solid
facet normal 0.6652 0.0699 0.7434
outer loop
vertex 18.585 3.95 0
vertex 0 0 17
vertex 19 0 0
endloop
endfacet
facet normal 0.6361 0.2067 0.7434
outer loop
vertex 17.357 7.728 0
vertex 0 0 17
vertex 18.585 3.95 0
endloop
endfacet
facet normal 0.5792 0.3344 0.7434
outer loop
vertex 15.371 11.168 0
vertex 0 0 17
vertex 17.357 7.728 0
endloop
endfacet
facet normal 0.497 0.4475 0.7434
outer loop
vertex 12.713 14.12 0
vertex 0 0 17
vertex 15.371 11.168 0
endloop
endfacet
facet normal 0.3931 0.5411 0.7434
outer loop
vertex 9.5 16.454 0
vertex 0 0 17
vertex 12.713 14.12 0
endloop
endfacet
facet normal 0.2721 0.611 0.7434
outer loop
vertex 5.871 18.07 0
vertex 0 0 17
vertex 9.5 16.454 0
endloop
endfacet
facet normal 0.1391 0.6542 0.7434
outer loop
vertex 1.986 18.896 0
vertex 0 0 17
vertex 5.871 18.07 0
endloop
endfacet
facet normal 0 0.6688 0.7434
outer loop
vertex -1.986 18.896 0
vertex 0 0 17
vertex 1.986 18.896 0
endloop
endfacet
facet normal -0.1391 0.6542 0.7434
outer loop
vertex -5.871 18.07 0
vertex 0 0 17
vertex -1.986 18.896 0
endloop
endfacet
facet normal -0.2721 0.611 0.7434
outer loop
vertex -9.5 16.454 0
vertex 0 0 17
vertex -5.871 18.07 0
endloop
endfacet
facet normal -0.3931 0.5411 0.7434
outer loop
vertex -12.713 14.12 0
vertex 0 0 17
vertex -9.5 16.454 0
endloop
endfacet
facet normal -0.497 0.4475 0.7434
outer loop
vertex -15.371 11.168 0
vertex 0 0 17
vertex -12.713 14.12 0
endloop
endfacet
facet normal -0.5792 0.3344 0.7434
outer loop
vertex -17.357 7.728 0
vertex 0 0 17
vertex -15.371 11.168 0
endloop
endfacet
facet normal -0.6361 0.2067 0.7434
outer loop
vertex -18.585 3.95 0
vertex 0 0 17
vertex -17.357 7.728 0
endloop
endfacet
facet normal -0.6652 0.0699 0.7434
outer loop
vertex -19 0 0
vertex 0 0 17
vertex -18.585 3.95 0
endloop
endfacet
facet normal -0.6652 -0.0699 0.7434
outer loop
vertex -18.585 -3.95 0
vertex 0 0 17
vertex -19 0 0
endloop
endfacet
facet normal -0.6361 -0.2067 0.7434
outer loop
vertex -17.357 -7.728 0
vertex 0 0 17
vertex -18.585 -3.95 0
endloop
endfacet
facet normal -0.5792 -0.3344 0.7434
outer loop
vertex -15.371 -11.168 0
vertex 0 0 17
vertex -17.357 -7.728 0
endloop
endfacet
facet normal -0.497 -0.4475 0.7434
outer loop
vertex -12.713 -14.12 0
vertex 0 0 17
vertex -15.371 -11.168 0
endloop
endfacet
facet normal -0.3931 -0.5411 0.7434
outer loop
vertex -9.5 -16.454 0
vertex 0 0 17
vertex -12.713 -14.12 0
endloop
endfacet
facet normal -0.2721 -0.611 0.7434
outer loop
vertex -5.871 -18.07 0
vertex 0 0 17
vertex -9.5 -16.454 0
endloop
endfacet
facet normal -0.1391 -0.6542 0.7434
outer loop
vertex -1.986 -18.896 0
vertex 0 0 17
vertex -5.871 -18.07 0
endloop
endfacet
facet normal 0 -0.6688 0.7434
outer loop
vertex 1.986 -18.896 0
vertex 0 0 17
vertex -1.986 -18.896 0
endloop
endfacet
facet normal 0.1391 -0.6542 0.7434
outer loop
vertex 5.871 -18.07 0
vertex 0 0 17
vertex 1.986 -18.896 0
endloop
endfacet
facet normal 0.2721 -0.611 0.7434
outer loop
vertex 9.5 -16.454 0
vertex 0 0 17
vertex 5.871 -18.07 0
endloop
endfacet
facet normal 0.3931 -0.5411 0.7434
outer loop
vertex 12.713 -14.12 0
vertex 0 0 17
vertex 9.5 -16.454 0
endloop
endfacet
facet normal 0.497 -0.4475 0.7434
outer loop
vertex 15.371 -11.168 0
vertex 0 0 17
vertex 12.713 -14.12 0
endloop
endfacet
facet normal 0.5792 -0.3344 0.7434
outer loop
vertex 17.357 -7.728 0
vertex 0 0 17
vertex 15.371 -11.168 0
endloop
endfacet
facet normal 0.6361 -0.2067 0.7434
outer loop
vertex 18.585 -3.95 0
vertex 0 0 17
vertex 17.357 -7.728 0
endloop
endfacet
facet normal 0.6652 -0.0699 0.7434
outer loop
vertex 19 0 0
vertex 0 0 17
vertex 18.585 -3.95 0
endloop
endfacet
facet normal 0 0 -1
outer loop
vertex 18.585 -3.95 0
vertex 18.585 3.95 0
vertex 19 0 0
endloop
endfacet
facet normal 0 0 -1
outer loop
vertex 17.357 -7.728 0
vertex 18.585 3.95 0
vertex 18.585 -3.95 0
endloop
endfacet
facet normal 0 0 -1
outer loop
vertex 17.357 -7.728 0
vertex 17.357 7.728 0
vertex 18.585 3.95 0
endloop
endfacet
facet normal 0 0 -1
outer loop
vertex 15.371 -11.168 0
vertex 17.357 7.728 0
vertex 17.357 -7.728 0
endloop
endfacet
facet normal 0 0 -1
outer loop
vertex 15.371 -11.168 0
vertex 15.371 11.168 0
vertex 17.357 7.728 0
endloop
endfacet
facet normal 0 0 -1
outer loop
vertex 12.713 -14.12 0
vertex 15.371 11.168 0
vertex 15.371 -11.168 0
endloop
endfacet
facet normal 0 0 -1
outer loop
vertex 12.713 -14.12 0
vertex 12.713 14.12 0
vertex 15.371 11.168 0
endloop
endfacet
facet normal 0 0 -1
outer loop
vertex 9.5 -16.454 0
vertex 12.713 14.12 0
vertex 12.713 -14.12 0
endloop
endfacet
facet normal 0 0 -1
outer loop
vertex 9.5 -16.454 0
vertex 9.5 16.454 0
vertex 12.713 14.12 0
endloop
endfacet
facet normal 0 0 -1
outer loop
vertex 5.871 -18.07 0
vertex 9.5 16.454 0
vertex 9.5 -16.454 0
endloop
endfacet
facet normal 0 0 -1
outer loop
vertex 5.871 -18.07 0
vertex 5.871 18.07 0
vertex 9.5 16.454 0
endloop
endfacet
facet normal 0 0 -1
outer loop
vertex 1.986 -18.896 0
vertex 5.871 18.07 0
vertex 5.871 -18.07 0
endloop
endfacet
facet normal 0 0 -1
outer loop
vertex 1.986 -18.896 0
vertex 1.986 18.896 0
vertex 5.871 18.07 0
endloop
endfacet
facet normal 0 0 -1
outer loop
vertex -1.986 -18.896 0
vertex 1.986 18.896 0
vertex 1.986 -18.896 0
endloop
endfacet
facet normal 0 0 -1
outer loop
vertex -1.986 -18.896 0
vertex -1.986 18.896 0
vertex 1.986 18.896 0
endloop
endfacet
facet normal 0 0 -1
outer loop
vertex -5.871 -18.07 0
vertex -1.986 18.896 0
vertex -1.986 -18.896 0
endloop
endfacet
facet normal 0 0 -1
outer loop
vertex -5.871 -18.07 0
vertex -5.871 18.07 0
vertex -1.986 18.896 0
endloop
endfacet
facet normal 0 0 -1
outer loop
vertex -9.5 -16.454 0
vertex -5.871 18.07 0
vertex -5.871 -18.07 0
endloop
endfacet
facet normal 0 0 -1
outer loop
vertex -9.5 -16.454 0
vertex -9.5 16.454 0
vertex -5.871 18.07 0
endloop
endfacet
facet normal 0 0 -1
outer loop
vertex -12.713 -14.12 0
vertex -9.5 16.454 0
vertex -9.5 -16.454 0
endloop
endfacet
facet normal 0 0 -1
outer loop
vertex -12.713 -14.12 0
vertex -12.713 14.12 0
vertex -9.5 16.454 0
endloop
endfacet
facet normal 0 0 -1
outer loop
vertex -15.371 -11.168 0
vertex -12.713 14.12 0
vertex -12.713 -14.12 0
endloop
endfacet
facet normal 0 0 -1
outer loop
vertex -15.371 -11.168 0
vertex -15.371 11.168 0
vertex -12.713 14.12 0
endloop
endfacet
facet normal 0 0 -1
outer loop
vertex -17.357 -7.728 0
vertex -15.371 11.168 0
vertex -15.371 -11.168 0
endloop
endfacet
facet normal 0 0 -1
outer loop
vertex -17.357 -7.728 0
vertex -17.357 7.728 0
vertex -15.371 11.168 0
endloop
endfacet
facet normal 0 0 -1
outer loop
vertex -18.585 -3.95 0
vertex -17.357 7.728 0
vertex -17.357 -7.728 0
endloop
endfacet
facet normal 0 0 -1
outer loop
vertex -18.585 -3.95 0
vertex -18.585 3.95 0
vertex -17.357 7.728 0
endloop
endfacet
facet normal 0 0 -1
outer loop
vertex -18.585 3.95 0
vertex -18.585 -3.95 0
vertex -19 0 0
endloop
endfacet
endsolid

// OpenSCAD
// Generated by SolidPython 1.0.1 on 2020-07-29 00:46:43


cylinder(h = 17, r1 = 19, r2 = 0);
/***********************************************
*********      SolidPython code:      **********
************************************************
 
# import packages: SolidPython
from solid import *
from solid.utils import *
from itertools import chain, combinations, permutations


class Resize:

    def __init__(self, scad_file):
        self.scad_file = scad_file
        #self.scad_file = import_scad(scad_file)
        # cone/cylinder param:
        self.r1 = 0
        self.r2 = 0
        self.h = 0
        # rectangular prism param:
        self.w = 0
        self.l = 0
        # ellipse param:
        self.r = 0

    # import OpenScad code (file name corresponds to shape)


    # classify shape + parameters
    def assign(self, param1, param2, param3):
        if self.scad_file == 'cone.scad':
            self.r1 = param1
            self.r2 = param2
            self.h = param3
        elif self.scad_file == 'cylinder.scad':
            self.r1 = param1
            self.r2 = param2
            self.h = param3
        elif self.scad_file == 'rectangularPrism.scad':
            self.h = param1
            self.l = param2
            self.w = param3
        else:
            self.r = param1
            self.h = param2

    # resize parameters
    def iterate(self):
        x = range(3, 20, 2)
        i = 1
        if self.scad_file == 'cone.scad':
            tempList = list(permutations(x, 2))
            for temp in tempList:
                param1 = temp[0]
                param2 = temp[1]
                filepath = 'produced_scad_files/' + 'cone' + str(param1) + '_' + str(param2) + '_' + '.scad'
                scad_render_to_file(cylinder(h=param1, r1=param2, r2=0), filepath)

        elif self.scad_file == 'cylinder.scad':
            tempList = list(permutations(x, 3))
            for temp in tempList:
                param1 = temp[0]
                param2 = temp[1]
                filepath = 'produced_scad_files/' + 'cylinder' + str(param1) + '_' + str(param2) + '_' + '.scad'
                scad_render_to_file(cylinder(h=param1, r1=param2, r2=param2), filepath)

        elif self.scad_file == 'rectangularPrism.scad':
            tempList = list(permutations(x, 3))
            for temp in tempList:
                param1 = temp[0]
                param2 = temp[1]
                param3 = temp[2]
                filepath = 'produced_scad_files/' + 'rectangularPrism' + str(param1) + '_' + str(param2) + '_' + str(
                    param3) + '.scad'
                scad_render_to_file(cube(size=(param1, param2, param3)), filepath)

        elif self.scad_file == 'ellipse.scad':
            tempList = list(permutations(x, 4))
            for temp in tempList:
                param1 = temp[0]
                param2 = temp[1]
                param3 = temp[2]
                param4 = temp[3]
                filepath = 'produced_scad_files/' + 'ellipse' + str(param1) + '_' + str(param2) + '_' + str(param3) + '_' + str(param4) + '.scad'
                scad_render_to_file(scale([param1, param2, param3])(sphere(r=param4)), filepath)

    def render_to_scadfile(self):
        scad_render_to_file(scad, 'example.scad') 
 
************************************************/
